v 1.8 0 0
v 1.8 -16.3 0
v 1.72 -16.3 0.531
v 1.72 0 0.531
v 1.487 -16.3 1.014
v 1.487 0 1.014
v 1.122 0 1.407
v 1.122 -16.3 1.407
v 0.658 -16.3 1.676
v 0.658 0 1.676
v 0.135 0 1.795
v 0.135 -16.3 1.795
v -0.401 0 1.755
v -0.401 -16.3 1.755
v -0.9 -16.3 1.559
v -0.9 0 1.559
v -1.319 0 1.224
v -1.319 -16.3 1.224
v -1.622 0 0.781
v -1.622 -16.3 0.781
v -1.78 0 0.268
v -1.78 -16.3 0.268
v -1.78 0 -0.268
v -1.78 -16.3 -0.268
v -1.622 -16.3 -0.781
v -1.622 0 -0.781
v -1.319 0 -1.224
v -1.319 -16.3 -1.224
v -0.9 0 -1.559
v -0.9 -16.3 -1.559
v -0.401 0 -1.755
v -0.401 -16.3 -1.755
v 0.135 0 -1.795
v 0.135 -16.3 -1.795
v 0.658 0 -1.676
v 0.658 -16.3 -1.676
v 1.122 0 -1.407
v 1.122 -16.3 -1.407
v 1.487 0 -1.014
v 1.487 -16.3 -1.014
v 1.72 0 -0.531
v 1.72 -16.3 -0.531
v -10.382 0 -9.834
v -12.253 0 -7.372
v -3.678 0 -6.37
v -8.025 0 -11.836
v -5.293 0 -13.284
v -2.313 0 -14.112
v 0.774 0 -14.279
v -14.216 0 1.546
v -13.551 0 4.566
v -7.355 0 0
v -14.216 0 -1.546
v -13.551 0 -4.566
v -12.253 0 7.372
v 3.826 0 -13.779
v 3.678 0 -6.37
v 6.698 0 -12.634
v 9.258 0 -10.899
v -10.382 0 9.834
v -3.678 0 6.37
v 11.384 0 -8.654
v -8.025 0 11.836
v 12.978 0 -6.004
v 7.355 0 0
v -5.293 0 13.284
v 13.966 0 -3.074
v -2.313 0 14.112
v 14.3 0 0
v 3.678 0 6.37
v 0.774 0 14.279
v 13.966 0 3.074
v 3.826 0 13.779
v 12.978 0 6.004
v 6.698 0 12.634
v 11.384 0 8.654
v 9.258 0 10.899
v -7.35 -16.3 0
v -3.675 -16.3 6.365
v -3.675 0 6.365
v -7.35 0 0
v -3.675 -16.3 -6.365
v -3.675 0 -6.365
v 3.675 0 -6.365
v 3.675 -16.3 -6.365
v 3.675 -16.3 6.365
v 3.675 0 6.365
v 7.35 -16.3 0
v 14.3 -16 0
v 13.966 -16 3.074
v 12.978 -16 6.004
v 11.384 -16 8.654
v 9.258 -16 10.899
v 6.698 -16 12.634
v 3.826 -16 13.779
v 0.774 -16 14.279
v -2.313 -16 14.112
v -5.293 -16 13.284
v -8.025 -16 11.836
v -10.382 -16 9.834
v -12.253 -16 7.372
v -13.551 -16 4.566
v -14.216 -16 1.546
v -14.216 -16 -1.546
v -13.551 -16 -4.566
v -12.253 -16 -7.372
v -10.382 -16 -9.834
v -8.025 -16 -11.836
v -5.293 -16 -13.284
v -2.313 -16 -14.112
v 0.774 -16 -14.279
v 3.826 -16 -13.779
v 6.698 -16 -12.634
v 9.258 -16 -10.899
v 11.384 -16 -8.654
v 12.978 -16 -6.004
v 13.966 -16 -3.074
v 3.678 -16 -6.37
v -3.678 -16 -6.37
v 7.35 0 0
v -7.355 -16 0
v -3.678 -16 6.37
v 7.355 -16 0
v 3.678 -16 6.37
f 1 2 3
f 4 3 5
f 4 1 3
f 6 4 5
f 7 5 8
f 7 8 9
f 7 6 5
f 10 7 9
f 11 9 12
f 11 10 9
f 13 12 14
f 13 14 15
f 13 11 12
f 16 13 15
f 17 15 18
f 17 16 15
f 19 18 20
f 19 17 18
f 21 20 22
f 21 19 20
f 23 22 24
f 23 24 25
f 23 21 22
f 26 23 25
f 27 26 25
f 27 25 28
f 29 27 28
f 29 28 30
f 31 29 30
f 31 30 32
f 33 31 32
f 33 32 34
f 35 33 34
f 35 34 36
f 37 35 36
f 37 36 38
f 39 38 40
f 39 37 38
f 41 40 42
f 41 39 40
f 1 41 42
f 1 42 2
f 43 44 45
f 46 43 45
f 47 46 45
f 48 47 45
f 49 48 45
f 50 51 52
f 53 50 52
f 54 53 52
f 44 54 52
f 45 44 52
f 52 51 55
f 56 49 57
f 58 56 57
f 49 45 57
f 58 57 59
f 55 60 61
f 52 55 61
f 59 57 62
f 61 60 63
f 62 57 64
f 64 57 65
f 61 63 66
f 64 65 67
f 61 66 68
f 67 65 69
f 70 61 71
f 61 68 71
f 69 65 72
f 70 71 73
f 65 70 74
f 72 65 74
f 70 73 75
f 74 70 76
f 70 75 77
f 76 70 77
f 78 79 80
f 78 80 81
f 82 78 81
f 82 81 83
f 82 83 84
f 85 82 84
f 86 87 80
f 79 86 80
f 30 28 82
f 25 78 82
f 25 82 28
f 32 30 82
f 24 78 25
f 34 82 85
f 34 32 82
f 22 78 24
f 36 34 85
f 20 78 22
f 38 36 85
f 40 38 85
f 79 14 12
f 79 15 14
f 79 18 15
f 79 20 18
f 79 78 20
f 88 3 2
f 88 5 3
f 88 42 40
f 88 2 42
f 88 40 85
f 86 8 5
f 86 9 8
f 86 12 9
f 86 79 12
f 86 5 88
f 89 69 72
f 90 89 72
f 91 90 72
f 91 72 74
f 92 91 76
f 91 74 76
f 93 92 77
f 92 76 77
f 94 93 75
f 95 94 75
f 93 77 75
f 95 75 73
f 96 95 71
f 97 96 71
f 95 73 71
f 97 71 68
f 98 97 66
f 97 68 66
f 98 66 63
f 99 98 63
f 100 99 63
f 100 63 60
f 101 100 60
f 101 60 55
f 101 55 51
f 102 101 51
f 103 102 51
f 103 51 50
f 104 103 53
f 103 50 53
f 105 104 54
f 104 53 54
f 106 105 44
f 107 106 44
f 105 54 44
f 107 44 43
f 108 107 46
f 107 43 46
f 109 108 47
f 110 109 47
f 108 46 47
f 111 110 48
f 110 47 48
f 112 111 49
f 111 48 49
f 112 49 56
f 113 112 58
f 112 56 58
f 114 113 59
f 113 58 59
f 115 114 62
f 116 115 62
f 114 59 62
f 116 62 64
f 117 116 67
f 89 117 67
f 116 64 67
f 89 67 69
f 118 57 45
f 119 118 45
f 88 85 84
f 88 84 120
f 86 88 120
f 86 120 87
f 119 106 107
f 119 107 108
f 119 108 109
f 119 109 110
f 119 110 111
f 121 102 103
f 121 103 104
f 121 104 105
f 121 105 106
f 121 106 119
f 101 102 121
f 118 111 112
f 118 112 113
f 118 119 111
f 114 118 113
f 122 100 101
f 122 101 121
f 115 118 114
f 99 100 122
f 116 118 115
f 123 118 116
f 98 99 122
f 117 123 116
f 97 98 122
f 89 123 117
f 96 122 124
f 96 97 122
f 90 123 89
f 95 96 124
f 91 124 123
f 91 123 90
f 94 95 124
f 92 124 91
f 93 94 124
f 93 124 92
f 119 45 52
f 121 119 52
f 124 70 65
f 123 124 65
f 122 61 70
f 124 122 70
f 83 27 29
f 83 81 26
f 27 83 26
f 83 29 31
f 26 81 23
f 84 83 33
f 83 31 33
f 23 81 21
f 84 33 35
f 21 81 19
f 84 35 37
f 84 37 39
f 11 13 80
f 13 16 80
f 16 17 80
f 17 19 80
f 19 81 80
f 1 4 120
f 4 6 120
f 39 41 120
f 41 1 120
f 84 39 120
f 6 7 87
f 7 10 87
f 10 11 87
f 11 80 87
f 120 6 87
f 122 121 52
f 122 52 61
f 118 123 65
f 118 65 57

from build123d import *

# Parameters (mm, degrees)
F0_R     = 1.8
F1_DEPTH = 16.3
F2_R     = 14.3
F3_DEPTH = 16


with BuildPart() as f1:
    # F0 (on Front) → F1 (new body)
    with BuildSketch(Plane.XZ):
        Polygon((3.674834, 6.365), (-3.674834, 6.365), (-7.349669, 0), (-3.674834, -6.365), (3.674834, -6.365), (7.349669, 0), align=None)
        Circle(F0_R, mode=Mode.SUBTRACT)
    extrude(amount=F1_DEPTH)


with BuildPart() as f3:
    # F2 (on Front) → F3 (new body)
    with BuildSketch(Plane.XZ):
        Circle(F2_R)
        Polygon((-7.355442, 0), (-3.677721, 6.37), (3.677721, 6.37), (7.355442, 0), (3.677721, -6.37), (-3.677721, -6.37), align=None, mode=Mode.SUBTRACT)
    extrude(amount=F3_DEPTH)


solid = Compound([f1.part, f3.part])
